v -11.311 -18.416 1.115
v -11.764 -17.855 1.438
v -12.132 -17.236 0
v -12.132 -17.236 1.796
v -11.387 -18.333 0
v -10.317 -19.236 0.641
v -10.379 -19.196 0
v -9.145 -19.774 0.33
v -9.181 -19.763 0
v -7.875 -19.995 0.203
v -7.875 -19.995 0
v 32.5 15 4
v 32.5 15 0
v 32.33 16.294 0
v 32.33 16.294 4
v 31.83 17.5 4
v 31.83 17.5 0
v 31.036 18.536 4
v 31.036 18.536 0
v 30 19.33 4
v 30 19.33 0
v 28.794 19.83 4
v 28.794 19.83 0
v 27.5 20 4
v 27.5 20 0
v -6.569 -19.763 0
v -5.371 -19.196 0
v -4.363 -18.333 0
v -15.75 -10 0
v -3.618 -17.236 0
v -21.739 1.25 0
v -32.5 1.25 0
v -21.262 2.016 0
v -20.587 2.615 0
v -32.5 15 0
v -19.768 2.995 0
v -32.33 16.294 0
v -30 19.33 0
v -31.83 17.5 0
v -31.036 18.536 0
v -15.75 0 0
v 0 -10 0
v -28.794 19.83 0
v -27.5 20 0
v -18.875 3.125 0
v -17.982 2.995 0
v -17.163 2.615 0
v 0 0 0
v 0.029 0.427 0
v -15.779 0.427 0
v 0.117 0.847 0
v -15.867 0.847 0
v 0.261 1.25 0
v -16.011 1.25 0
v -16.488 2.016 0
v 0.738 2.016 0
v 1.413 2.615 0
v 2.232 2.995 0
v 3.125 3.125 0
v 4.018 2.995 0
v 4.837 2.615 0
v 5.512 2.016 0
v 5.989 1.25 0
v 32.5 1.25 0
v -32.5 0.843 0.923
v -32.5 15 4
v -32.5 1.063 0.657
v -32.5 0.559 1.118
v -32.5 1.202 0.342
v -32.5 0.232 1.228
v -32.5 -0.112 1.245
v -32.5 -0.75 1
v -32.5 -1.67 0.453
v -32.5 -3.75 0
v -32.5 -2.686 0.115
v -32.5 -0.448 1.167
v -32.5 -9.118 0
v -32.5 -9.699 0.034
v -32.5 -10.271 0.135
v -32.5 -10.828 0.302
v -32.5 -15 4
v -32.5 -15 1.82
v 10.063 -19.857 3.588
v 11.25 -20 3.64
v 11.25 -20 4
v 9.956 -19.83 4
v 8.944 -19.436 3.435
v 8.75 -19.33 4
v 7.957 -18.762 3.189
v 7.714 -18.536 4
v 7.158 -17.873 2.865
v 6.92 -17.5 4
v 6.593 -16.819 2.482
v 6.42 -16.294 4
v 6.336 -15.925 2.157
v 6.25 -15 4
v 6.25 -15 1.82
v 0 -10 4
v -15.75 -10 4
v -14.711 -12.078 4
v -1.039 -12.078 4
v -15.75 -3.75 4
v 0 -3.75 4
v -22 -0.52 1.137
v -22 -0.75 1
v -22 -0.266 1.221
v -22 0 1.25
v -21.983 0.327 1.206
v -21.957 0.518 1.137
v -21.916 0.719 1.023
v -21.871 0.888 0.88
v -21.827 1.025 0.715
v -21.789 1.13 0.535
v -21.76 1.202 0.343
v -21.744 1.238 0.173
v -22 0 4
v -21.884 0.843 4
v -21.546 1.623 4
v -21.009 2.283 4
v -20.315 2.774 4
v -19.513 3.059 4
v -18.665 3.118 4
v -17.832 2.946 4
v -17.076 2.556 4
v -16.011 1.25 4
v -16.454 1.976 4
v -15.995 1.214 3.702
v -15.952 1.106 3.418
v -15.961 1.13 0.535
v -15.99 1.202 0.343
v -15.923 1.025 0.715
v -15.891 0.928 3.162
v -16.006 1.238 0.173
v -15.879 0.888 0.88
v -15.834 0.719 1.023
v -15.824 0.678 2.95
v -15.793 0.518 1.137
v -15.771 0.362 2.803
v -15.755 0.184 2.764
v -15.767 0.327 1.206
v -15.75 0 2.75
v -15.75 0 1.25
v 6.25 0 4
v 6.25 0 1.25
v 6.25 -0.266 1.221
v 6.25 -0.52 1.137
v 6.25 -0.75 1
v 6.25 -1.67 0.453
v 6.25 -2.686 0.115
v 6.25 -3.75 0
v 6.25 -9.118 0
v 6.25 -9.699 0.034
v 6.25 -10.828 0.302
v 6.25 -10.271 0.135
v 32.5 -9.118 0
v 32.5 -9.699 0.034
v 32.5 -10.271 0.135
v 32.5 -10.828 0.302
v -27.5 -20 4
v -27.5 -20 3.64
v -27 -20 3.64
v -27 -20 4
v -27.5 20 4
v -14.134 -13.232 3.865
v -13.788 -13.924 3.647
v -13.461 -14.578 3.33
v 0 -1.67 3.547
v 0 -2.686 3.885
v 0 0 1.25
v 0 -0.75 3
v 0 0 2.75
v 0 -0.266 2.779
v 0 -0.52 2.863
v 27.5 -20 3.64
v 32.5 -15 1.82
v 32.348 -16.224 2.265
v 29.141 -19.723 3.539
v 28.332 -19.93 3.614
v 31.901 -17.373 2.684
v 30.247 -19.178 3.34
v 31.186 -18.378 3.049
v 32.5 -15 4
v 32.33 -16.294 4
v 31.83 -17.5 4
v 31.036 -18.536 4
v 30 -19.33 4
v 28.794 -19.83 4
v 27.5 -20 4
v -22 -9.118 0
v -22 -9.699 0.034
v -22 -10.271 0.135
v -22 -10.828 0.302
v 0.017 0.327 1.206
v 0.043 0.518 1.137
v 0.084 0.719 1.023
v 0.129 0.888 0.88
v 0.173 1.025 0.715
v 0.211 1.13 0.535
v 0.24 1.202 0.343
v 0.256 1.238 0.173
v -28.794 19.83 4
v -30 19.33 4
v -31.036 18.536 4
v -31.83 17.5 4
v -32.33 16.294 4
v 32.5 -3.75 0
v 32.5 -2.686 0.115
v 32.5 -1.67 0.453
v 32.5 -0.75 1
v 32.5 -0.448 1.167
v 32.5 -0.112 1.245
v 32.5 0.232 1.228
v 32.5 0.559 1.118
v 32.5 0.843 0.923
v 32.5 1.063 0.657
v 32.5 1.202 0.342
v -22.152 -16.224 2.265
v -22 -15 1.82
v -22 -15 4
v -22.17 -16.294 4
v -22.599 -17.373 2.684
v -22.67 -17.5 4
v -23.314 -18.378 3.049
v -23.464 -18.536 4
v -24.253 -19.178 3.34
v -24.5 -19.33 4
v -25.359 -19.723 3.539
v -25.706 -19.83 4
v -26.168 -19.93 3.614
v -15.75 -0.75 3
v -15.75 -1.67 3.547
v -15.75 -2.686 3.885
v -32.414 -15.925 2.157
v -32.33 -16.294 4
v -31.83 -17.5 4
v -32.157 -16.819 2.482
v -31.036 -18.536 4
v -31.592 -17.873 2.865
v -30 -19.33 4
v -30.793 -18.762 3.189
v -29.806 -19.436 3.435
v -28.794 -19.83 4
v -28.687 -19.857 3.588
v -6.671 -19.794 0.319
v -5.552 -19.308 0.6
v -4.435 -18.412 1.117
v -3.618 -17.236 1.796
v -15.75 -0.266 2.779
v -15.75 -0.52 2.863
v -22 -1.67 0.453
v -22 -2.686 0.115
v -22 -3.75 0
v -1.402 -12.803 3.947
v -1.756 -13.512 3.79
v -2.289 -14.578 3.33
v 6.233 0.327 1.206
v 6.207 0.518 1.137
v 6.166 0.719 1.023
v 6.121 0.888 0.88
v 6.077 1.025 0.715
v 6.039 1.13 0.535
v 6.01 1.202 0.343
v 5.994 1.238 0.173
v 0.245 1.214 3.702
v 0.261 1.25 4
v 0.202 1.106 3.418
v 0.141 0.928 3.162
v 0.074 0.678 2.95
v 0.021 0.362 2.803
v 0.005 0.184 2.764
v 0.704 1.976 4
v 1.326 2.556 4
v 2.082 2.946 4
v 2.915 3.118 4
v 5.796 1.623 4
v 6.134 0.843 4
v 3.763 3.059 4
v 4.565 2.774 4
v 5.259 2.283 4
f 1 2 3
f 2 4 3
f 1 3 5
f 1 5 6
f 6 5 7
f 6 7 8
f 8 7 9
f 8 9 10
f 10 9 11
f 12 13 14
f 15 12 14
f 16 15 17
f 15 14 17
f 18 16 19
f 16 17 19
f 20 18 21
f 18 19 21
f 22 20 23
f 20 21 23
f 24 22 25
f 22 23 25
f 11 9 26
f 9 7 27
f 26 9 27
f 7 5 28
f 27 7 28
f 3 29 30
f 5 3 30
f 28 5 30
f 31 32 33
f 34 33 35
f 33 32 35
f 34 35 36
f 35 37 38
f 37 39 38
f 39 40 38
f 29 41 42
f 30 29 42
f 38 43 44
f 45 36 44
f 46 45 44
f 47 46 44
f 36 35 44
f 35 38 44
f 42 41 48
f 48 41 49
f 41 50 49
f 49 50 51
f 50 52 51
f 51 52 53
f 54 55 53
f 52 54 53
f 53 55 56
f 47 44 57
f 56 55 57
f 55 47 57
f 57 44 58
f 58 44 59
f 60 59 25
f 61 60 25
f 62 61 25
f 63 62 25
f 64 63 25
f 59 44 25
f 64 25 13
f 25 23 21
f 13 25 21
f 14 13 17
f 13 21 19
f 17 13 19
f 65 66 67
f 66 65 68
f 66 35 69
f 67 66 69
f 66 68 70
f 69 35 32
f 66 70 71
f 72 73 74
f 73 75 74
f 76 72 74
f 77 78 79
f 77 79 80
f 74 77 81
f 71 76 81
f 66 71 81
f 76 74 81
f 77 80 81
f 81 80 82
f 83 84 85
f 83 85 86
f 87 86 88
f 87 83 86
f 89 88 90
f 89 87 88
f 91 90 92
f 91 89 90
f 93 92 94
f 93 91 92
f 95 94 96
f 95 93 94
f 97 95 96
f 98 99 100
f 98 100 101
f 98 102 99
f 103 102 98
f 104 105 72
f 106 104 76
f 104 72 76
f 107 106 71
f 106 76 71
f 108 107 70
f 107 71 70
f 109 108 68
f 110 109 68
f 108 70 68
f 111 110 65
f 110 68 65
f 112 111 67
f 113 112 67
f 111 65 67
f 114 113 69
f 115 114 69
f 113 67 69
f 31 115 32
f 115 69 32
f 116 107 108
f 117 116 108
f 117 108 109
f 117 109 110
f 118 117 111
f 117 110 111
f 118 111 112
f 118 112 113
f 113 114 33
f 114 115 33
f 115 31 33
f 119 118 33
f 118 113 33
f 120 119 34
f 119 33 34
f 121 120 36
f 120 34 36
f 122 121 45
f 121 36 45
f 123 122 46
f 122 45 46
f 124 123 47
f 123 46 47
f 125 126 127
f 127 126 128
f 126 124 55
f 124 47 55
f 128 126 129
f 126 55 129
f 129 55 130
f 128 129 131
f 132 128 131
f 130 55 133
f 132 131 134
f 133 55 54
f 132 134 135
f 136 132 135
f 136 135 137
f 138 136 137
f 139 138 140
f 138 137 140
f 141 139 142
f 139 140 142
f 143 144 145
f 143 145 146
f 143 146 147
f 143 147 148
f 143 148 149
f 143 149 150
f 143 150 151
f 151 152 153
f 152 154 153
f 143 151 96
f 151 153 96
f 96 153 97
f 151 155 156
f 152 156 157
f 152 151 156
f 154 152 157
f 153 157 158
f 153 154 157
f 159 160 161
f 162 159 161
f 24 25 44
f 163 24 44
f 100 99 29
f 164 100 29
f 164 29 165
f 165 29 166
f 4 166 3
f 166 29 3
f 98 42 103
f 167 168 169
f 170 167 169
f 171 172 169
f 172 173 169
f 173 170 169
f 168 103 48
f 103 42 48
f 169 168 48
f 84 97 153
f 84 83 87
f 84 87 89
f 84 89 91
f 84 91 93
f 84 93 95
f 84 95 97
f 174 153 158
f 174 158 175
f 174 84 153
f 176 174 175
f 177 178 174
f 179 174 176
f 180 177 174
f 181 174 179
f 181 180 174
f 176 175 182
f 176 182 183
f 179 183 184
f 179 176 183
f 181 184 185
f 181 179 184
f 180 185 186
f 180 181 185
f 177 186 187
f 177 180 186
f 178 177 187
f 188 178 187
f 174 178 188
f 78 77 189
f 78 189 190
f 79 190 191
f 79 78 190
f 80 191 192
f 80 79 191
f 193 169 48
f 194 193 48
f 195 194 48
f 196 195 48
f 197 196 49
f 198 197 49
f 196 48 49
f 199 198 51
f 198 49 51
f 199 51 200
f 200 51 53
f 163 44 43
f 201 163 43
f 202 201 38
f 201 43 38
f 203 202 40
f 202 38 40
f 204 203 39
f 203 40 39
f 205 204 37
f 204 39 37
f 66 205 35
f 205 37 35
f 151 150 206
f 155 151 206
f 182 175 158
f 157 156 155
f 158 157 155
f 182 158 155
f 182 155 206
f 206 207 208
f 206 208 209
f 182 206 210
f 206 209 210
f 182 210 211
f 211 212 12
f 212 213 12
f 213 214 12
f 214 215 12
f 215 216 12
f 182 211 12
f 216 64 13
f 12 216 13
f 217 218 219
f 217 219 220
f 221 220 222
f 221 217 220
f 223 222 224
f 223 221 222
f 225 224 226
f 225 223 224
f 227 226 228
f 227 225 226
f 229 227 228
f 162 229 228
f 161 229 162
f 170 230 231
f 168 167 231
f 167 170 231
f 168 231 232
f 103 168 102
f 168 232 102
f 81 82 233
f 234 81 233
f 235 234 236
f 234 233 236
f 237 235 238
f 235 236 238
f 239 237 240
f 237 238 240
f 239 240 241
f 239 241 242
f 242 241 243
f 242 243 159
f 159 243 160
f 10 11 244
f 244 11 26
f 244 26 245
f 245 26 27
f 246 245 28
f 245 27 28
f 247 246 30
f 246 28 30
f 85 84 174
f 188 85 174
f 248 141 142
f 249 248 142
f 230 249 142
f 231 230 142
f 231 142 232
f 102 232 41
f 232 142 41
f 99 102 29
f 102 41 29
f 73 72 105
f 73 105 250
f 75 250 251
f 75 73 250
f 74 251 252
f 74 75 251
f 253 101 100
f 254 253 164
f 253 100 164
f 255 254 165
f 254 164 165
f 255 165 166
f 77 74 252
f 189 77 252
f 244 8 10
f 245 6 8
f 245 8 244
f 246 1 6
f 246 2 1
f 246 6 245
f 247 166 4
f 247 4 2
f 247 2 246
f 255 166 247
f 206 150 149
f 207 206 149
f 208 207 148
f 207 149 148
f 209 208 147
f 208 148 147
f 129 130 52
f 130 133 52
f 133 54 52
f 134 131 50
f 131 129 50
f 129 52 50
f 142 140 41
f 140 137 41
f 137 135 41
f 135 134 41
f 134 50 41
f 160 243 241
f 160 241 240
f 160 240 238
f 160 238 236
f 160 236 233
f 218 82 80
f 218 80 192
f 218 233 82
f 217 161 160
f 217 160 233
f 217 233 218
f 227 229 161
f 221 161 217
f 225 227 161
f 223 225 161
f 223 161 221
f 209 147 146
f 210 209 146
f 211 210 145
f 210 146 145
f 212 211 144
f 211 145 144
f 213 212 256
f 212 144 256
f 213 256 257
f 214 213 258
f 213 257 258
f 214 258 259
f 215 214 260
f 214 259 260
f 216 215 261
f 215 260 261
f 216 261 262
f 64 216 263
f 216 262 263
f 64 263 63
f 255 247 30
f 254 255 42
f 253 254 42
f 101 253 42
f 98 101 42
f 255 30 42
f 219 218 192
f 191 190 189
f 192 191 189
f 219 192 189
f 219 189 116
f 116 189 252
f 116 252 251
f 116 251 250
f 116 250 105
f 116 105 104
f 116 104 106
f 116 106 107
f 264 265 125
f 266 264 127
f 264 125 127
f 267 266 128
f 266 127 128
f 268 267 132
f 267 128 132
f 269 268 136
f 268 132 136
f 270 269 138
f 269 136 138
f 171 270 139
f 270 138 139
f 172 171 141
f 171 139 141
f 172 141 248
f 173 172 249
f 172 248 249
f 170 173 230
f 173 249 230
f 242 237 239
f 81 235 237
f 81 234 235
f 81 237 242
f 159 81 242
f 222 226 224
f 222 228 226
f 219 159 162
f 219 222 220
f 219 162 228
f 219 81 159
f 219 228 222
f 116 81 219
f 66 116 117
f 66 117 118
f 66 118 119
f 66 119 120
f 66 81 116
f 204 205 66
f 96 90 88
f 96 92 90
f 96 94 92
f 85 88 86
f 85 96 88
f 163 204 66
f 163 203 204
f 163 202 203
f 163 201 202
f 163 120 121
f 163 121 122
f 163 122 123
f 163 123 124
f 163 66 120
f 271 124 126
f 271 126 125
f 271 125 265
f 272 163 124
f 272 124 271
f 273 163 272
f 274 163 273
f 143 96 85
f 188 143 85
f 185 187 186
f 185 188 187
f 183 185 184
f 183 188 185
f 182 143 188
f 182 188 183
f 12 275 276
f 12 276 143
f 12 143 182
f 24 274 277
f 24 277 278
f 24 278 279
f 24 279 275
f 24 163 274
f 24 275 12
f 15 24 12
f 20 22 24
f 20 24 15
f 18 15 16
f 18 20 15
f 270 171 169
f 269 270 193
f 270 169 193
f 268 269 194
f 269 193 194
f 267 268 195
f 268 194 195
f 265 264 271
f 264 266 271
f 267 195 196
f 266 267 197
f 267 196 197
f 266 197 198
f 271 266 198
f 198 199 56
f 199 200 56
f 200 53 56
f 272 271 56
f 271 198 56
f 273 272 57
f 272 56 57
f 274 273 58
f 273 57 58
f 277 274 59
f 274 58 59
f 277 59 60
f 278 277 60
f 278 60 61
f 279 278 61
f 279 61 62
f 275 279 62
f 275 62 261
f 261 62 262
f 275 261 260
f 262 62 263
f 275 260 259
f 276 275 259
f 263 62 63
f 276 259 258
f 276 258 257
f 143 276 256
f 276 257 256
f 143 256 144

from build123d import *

# Parameters (mm, degrees)
F1_DEPTH      = 4
F3_DEPTH      = 65.001
F5_DEPTH      = 2
F8_DEPTH      = 20
F9_SIZE2      = 6.5817930688
F9_SIZE       = 3.8
F10_SIZE2     = 3.6397023427
F10_SIZE      = 10
F10_2_SIZE2   = 3.6397023427
F10_2_SIZE    = 10
F11_T1_DEPTH  = 19.0305228795
F11_T3_DEPTH  = 14.9081745177
F11_T5_DEPTH  = 30.6581745177
F11_T7_DEPTH  = 38.75
F11_T9_DEPTH  = 23
F11_T11_DEPTH = 28.25
F11_T13_DEPTH = 29
F11_T15_DEPTH = 25.3602976573
F11_T17_DEPTH = 15.6508497187


# Not quite as in the source:
# - a fillet or chamfer that OpenCascade refuses, or shapes differently, is made with other operations: its cross-section is extruded or revolved along the edge and cut away or added


with BuildPart() as f1:
    # F0 (on Top) → F1 (new body)
    with BuildSketch(Plane.XY):
        with BuildLine():
            Line((32.5, -20), (32.5, 20))
            Line((32.5, 20), (-32.5, 20))
            Line((-32.5, 20), (-32.5, -20))
            Line((-32.5, -20), (-22, -20))
            Line((-22, -20), (-22, 0))
            ThreePointArc((-22, 0), (-18.875, 3.125), (-15.75, 0))
            Line((-15.75, 0), (-15.75, -10))
            Line((-15.75, -10), (-10.75, -20))
            Line((-10.75, -20), (-5, -20))
            Line((-5, -20), (0, -10))
            Line((0, -10), (0, 0))
            ThreePointArc((0, 0), (3.125, 3.125), (6.25, 0))
            Line((6.25, 0), (6.25, -20))
            Line((6.25, -20), (32.5, -20))
        make_face()
    extrude(amount=F1_DEPTH)

    # F2 (on face) → F3 (cut, through all)
    with BuildSketch(Plane(origin=(-32.5, 0, 0), x_dir=(0, -1, 0), z_dir=(-1, 0, 0))):
        with BuildLine():
            Line((-1.25, 0), (1.25, 0))
            ThreePointArc((1.25, 0), (0, 1.25), (-1.25, 0))
        make_face()
    extrude(amount=-F3_DEPTH, mode=Mode.SUBTRACT)

    # F4 (on face) → F5 (join)
    with BuildSketch(Plane.XY):
        with BuildLine():
            ThreePointArc((0, 0), (0.0659177721, 0.6384676365), (0.2608901907, 1.25))
            Line((0.2608901907, 1.25), (-16.0108901907, 1.25))
            ThreePointArc((-16.0108901907, 1.25), (-15.8159177721, 0.6384676365), (-15.75, 0))
            Line((-15.75, 0), (-15.75, -1.25))
            Line((-15.75, -1.25), (0, -1.25))
            Line((0, -1.25), (0, 0))
        make_face()
    extrude(amount=F5_DEPTH)

    # F7 (on offset) → F8 (cut)
    with BuildSketch(Plane(origin=(-17.75, 0, 0), x_dir=(0, -1, 0), z_dir=(-1, 0, 0))):
        with BuildLine():
            Line((1.25, 4), (0, 4))
            Line((0, 4), (-1.25, 4))
            ThreePointArc((-1.25, 4), (0, 2.75), (1.25, 4))
        make_face()
    extrude(amount=-F8_DEPTH, mode=Mode.SUBTRACT)

    # F9
    f9_edges = [f1.edges().sort_by_distance(p)[0] for p in [
        (-7.875, -20, 4),
    ]]
    f9_side = f1.faces().sort_by_distance((-7.875, -20, 2))[0]
    chamfer(f9_edges, length=F9_SIZE, length2=F9_SIZE2, reference=f9_side)

    # F10
    f10_edges = [f1.edges().sort_by_distance(p)[0] for p in [
        (-27.25, -20, 0),
    ]]
    f10_side = f1.faces().sort_by_distance((-27.25, -10.625, 0))[0]
    chamfer(f10_edges, length=F10_SIZE, length2=F10_SIZE2, reference=f10_side)

    # F10#2
    f10_2_edges = [f1.edges().sort_by_distance(p)[0] for p in [
        (19.375, -20, 0),
    ]]
    f10_2_side = f1.faces().sort_by_distance((19.375, -10.625, 0))[0]
    chamfer(f10_2_edges, length=F10_2_SIZE, length2=F10_2_SIZE2, reference=f10_2_side)

    # F11: fillet of radius 5 on 14 edges, made by hand

    # F11_s2 → F11_t1 (cut)
    with BuildSketch(Plane.YZ.offset(-17.3902614398)):
        with BuildLine():
            ThreePointArc((-12.0784609691, 4), (-13.3725561946, 3.8296291314), (-14.5784609691, 3.3301270189))
            Line((-14.5784609691, 3.3301270189), (-13.4182069312, 4))
            Line((-13.4182069312, 4), (-12.0784609691, 4))
        make_face()
    extrude(amount=F11_T1_DEPTH, mode=Mode.SUBTRACT)

    # F11_s4 → F11_t3 (cut)
    with BuildSketch(Plane.YZ.offset(-34.7040872589)):
        with BuildLine():
            ThreePointArc((-9.1183650965, 0), (-9.9866059848, 0.0759612349), (-10.8284658131, 0.3015368961))
            Line((-10.8284658131, 0.3015368961), (-10, 0))
            Line((-10, 0), (-9.1183650965, 0))
        make_face()
    extrude(amount=F11_T3_DEPTH, mode=Mode.SUBTRACT)

    # F11_s6 → F11_t5 (cut)
    with BuildSketch(Plane.YZ.offset(4.0459127411)):
        with BuildLine():
            ThreePointArc((-9.1183650965, 0), (-9.9866059848, 0.0759612349), (-10.8284658131, 0.3015368961))
            Line((-10.8284658131, 0.3015368961), (-10, 0))
            Line((-10, 0), (-9.1183650965, 0))
        make_face()
    extrude(amount=F11_T5_DEPTH, mode=Mode.SUBTRACT)

    # F11_s8 → F11_t7 (cut)
    with BuildSketch(Plane.YZ):
        with BuildLine():
            ThreePointArc((-3.75, 0), (-2.1688611699, 0.2565835097), (-0.75, 1))
            ThreePointArc((-0.75, 1), (-1.1180339887, 0.5590169944), (-1.25, 0))
            Line((-1.25, 0), (-3.75, 0))
        make_face()
    extrude(amount=F11_T7_DEPTH, mode=Mode.SUBTRACT)

    # F11_s10 → F11_t9 (cut)
    with BuildSketch(Plane.YZ.offset(-38.75)):
        with BuildLine():
            ThreePointArc((-0.75, 1), (-2.1688611699, 0.2565835097), (-3.75, 0))
            Line((-3.75, 0), (-1.25, 0))
            ThreePointArc((-1.25, 0), (-1.1180339887, 0.5590169944), (-0.75, 1))
        make_face()
    extrude(amount=F11_T9_DEPTH, mode=Mode.SUBTRACT)

    # F11_s12 → F11_t11 (cut)
    with BuildSketch(Plane.YZ.offset(-22)):
        with BuildLine():
            ThreePointArc((-0.75, 3), (-2.1688611699, 3.7434164903), (-3.75, 4))
            Line((-3.75, 4), (-1.25, 4))
            ThreePointArc((-1.25, 4), (-1.1180339887, 3.4409830056), (-0.75, 3))
        make_face()
    extrude(amount=F11_T11_DEPTH, mode=Mode.SUBTRACT)

    # F11_s14 → F11_t13 (cut)
    with BuildSketch(Plane.XY.offset(-12.5)):
        with BuildLine():
            ThreePointArc((-27.5, 20), (-31.0355339059, 18.5355339059), (-32.5, 15))
            Line((-32.5, 15), (-32.5, 20))
            Line((-32.5, 20), (-27.5, 20))
        make_face()
        with BuildLine():
            ThreePointArc((32.5, 15), (31.0355339059, 18.5355339059), (27.5, 20))
            Line((27.5, 20), (32.5, 20))
            Line((32.5, 20), (32.5, 15))
        make_face()
    extrude(amount=F11_T13_DEPTH, mode=Mode.SUBTRACT)

    # F11_s16 → F11_t15 (cut)
    with BuildSketch(Plane.XY.offset(-8.8602976573)):
        with BuildLine():
            ThreePointArc((-32.5, -15), (-31.0355339059, -18.5355339059), (-27.5, -20))
            Line((-27.5, -20), (-32.5, -20))
            Line((-32.5, -20), (-32.5, -15))
        make_face()
        with BuildLine():
            ThreePointArc((-22, -15), (-23.4644660941, -18.5355339059), (-27, -20))
            Line((-27, -20), (-22, -20))
            Line((-22, -20), (-22, -15))
        make_face()
        with BuildLine():
            ThreePointArc((11.25, -20), (7.7144660941, -18.5355339059), (6.25, -15))
            Line((6.25, -15), (6.25, -20))
            Line((6.25, -20), (11.25, -20))
        make_face()
        with BuildLine():
            ThreePointArc((32.5, -15), (31.0355339059, -18.5355339059), (27.5, -20))
            Line((27.5, -20), (32.5, -20))
            Line((32.5, -20), (32.5, -15))
        make_face()
    extrude(amount=F11_T15_DEPTH, mode=Mode.SUBTRACT)

    # F11_s18 → F11_t17 (cut)
    with BuildSketch(Plane.XY.offset(-7.7254248594)):
        with BuildLine():
            ThreePointArc((-8.0901699437, -20), (-5.4615143832, -19.2532540418), (-3.6180339887, -17.2360679775))
            Line((-3.6180339887, -17.2360679775), (-5, -20))
            Line((-5, -20), (-8.0901699437, -20))
        make_face()
        with BuildLine():
            ThreePointArc((-12.1319660113, -17.2360679775), (-10.2884856168, -19.2532540418), (-7.6598300563, -20))
            Line((-7.6598300563, -20), (-10.75, -20))
            Line((-10.75, -20), (-12.1319660113, -17.2360679775))
        make_face()
    extrude(amount=F11_T17_DEPTH, mode=Mode.SUBTRACT)


solid = f1.part
